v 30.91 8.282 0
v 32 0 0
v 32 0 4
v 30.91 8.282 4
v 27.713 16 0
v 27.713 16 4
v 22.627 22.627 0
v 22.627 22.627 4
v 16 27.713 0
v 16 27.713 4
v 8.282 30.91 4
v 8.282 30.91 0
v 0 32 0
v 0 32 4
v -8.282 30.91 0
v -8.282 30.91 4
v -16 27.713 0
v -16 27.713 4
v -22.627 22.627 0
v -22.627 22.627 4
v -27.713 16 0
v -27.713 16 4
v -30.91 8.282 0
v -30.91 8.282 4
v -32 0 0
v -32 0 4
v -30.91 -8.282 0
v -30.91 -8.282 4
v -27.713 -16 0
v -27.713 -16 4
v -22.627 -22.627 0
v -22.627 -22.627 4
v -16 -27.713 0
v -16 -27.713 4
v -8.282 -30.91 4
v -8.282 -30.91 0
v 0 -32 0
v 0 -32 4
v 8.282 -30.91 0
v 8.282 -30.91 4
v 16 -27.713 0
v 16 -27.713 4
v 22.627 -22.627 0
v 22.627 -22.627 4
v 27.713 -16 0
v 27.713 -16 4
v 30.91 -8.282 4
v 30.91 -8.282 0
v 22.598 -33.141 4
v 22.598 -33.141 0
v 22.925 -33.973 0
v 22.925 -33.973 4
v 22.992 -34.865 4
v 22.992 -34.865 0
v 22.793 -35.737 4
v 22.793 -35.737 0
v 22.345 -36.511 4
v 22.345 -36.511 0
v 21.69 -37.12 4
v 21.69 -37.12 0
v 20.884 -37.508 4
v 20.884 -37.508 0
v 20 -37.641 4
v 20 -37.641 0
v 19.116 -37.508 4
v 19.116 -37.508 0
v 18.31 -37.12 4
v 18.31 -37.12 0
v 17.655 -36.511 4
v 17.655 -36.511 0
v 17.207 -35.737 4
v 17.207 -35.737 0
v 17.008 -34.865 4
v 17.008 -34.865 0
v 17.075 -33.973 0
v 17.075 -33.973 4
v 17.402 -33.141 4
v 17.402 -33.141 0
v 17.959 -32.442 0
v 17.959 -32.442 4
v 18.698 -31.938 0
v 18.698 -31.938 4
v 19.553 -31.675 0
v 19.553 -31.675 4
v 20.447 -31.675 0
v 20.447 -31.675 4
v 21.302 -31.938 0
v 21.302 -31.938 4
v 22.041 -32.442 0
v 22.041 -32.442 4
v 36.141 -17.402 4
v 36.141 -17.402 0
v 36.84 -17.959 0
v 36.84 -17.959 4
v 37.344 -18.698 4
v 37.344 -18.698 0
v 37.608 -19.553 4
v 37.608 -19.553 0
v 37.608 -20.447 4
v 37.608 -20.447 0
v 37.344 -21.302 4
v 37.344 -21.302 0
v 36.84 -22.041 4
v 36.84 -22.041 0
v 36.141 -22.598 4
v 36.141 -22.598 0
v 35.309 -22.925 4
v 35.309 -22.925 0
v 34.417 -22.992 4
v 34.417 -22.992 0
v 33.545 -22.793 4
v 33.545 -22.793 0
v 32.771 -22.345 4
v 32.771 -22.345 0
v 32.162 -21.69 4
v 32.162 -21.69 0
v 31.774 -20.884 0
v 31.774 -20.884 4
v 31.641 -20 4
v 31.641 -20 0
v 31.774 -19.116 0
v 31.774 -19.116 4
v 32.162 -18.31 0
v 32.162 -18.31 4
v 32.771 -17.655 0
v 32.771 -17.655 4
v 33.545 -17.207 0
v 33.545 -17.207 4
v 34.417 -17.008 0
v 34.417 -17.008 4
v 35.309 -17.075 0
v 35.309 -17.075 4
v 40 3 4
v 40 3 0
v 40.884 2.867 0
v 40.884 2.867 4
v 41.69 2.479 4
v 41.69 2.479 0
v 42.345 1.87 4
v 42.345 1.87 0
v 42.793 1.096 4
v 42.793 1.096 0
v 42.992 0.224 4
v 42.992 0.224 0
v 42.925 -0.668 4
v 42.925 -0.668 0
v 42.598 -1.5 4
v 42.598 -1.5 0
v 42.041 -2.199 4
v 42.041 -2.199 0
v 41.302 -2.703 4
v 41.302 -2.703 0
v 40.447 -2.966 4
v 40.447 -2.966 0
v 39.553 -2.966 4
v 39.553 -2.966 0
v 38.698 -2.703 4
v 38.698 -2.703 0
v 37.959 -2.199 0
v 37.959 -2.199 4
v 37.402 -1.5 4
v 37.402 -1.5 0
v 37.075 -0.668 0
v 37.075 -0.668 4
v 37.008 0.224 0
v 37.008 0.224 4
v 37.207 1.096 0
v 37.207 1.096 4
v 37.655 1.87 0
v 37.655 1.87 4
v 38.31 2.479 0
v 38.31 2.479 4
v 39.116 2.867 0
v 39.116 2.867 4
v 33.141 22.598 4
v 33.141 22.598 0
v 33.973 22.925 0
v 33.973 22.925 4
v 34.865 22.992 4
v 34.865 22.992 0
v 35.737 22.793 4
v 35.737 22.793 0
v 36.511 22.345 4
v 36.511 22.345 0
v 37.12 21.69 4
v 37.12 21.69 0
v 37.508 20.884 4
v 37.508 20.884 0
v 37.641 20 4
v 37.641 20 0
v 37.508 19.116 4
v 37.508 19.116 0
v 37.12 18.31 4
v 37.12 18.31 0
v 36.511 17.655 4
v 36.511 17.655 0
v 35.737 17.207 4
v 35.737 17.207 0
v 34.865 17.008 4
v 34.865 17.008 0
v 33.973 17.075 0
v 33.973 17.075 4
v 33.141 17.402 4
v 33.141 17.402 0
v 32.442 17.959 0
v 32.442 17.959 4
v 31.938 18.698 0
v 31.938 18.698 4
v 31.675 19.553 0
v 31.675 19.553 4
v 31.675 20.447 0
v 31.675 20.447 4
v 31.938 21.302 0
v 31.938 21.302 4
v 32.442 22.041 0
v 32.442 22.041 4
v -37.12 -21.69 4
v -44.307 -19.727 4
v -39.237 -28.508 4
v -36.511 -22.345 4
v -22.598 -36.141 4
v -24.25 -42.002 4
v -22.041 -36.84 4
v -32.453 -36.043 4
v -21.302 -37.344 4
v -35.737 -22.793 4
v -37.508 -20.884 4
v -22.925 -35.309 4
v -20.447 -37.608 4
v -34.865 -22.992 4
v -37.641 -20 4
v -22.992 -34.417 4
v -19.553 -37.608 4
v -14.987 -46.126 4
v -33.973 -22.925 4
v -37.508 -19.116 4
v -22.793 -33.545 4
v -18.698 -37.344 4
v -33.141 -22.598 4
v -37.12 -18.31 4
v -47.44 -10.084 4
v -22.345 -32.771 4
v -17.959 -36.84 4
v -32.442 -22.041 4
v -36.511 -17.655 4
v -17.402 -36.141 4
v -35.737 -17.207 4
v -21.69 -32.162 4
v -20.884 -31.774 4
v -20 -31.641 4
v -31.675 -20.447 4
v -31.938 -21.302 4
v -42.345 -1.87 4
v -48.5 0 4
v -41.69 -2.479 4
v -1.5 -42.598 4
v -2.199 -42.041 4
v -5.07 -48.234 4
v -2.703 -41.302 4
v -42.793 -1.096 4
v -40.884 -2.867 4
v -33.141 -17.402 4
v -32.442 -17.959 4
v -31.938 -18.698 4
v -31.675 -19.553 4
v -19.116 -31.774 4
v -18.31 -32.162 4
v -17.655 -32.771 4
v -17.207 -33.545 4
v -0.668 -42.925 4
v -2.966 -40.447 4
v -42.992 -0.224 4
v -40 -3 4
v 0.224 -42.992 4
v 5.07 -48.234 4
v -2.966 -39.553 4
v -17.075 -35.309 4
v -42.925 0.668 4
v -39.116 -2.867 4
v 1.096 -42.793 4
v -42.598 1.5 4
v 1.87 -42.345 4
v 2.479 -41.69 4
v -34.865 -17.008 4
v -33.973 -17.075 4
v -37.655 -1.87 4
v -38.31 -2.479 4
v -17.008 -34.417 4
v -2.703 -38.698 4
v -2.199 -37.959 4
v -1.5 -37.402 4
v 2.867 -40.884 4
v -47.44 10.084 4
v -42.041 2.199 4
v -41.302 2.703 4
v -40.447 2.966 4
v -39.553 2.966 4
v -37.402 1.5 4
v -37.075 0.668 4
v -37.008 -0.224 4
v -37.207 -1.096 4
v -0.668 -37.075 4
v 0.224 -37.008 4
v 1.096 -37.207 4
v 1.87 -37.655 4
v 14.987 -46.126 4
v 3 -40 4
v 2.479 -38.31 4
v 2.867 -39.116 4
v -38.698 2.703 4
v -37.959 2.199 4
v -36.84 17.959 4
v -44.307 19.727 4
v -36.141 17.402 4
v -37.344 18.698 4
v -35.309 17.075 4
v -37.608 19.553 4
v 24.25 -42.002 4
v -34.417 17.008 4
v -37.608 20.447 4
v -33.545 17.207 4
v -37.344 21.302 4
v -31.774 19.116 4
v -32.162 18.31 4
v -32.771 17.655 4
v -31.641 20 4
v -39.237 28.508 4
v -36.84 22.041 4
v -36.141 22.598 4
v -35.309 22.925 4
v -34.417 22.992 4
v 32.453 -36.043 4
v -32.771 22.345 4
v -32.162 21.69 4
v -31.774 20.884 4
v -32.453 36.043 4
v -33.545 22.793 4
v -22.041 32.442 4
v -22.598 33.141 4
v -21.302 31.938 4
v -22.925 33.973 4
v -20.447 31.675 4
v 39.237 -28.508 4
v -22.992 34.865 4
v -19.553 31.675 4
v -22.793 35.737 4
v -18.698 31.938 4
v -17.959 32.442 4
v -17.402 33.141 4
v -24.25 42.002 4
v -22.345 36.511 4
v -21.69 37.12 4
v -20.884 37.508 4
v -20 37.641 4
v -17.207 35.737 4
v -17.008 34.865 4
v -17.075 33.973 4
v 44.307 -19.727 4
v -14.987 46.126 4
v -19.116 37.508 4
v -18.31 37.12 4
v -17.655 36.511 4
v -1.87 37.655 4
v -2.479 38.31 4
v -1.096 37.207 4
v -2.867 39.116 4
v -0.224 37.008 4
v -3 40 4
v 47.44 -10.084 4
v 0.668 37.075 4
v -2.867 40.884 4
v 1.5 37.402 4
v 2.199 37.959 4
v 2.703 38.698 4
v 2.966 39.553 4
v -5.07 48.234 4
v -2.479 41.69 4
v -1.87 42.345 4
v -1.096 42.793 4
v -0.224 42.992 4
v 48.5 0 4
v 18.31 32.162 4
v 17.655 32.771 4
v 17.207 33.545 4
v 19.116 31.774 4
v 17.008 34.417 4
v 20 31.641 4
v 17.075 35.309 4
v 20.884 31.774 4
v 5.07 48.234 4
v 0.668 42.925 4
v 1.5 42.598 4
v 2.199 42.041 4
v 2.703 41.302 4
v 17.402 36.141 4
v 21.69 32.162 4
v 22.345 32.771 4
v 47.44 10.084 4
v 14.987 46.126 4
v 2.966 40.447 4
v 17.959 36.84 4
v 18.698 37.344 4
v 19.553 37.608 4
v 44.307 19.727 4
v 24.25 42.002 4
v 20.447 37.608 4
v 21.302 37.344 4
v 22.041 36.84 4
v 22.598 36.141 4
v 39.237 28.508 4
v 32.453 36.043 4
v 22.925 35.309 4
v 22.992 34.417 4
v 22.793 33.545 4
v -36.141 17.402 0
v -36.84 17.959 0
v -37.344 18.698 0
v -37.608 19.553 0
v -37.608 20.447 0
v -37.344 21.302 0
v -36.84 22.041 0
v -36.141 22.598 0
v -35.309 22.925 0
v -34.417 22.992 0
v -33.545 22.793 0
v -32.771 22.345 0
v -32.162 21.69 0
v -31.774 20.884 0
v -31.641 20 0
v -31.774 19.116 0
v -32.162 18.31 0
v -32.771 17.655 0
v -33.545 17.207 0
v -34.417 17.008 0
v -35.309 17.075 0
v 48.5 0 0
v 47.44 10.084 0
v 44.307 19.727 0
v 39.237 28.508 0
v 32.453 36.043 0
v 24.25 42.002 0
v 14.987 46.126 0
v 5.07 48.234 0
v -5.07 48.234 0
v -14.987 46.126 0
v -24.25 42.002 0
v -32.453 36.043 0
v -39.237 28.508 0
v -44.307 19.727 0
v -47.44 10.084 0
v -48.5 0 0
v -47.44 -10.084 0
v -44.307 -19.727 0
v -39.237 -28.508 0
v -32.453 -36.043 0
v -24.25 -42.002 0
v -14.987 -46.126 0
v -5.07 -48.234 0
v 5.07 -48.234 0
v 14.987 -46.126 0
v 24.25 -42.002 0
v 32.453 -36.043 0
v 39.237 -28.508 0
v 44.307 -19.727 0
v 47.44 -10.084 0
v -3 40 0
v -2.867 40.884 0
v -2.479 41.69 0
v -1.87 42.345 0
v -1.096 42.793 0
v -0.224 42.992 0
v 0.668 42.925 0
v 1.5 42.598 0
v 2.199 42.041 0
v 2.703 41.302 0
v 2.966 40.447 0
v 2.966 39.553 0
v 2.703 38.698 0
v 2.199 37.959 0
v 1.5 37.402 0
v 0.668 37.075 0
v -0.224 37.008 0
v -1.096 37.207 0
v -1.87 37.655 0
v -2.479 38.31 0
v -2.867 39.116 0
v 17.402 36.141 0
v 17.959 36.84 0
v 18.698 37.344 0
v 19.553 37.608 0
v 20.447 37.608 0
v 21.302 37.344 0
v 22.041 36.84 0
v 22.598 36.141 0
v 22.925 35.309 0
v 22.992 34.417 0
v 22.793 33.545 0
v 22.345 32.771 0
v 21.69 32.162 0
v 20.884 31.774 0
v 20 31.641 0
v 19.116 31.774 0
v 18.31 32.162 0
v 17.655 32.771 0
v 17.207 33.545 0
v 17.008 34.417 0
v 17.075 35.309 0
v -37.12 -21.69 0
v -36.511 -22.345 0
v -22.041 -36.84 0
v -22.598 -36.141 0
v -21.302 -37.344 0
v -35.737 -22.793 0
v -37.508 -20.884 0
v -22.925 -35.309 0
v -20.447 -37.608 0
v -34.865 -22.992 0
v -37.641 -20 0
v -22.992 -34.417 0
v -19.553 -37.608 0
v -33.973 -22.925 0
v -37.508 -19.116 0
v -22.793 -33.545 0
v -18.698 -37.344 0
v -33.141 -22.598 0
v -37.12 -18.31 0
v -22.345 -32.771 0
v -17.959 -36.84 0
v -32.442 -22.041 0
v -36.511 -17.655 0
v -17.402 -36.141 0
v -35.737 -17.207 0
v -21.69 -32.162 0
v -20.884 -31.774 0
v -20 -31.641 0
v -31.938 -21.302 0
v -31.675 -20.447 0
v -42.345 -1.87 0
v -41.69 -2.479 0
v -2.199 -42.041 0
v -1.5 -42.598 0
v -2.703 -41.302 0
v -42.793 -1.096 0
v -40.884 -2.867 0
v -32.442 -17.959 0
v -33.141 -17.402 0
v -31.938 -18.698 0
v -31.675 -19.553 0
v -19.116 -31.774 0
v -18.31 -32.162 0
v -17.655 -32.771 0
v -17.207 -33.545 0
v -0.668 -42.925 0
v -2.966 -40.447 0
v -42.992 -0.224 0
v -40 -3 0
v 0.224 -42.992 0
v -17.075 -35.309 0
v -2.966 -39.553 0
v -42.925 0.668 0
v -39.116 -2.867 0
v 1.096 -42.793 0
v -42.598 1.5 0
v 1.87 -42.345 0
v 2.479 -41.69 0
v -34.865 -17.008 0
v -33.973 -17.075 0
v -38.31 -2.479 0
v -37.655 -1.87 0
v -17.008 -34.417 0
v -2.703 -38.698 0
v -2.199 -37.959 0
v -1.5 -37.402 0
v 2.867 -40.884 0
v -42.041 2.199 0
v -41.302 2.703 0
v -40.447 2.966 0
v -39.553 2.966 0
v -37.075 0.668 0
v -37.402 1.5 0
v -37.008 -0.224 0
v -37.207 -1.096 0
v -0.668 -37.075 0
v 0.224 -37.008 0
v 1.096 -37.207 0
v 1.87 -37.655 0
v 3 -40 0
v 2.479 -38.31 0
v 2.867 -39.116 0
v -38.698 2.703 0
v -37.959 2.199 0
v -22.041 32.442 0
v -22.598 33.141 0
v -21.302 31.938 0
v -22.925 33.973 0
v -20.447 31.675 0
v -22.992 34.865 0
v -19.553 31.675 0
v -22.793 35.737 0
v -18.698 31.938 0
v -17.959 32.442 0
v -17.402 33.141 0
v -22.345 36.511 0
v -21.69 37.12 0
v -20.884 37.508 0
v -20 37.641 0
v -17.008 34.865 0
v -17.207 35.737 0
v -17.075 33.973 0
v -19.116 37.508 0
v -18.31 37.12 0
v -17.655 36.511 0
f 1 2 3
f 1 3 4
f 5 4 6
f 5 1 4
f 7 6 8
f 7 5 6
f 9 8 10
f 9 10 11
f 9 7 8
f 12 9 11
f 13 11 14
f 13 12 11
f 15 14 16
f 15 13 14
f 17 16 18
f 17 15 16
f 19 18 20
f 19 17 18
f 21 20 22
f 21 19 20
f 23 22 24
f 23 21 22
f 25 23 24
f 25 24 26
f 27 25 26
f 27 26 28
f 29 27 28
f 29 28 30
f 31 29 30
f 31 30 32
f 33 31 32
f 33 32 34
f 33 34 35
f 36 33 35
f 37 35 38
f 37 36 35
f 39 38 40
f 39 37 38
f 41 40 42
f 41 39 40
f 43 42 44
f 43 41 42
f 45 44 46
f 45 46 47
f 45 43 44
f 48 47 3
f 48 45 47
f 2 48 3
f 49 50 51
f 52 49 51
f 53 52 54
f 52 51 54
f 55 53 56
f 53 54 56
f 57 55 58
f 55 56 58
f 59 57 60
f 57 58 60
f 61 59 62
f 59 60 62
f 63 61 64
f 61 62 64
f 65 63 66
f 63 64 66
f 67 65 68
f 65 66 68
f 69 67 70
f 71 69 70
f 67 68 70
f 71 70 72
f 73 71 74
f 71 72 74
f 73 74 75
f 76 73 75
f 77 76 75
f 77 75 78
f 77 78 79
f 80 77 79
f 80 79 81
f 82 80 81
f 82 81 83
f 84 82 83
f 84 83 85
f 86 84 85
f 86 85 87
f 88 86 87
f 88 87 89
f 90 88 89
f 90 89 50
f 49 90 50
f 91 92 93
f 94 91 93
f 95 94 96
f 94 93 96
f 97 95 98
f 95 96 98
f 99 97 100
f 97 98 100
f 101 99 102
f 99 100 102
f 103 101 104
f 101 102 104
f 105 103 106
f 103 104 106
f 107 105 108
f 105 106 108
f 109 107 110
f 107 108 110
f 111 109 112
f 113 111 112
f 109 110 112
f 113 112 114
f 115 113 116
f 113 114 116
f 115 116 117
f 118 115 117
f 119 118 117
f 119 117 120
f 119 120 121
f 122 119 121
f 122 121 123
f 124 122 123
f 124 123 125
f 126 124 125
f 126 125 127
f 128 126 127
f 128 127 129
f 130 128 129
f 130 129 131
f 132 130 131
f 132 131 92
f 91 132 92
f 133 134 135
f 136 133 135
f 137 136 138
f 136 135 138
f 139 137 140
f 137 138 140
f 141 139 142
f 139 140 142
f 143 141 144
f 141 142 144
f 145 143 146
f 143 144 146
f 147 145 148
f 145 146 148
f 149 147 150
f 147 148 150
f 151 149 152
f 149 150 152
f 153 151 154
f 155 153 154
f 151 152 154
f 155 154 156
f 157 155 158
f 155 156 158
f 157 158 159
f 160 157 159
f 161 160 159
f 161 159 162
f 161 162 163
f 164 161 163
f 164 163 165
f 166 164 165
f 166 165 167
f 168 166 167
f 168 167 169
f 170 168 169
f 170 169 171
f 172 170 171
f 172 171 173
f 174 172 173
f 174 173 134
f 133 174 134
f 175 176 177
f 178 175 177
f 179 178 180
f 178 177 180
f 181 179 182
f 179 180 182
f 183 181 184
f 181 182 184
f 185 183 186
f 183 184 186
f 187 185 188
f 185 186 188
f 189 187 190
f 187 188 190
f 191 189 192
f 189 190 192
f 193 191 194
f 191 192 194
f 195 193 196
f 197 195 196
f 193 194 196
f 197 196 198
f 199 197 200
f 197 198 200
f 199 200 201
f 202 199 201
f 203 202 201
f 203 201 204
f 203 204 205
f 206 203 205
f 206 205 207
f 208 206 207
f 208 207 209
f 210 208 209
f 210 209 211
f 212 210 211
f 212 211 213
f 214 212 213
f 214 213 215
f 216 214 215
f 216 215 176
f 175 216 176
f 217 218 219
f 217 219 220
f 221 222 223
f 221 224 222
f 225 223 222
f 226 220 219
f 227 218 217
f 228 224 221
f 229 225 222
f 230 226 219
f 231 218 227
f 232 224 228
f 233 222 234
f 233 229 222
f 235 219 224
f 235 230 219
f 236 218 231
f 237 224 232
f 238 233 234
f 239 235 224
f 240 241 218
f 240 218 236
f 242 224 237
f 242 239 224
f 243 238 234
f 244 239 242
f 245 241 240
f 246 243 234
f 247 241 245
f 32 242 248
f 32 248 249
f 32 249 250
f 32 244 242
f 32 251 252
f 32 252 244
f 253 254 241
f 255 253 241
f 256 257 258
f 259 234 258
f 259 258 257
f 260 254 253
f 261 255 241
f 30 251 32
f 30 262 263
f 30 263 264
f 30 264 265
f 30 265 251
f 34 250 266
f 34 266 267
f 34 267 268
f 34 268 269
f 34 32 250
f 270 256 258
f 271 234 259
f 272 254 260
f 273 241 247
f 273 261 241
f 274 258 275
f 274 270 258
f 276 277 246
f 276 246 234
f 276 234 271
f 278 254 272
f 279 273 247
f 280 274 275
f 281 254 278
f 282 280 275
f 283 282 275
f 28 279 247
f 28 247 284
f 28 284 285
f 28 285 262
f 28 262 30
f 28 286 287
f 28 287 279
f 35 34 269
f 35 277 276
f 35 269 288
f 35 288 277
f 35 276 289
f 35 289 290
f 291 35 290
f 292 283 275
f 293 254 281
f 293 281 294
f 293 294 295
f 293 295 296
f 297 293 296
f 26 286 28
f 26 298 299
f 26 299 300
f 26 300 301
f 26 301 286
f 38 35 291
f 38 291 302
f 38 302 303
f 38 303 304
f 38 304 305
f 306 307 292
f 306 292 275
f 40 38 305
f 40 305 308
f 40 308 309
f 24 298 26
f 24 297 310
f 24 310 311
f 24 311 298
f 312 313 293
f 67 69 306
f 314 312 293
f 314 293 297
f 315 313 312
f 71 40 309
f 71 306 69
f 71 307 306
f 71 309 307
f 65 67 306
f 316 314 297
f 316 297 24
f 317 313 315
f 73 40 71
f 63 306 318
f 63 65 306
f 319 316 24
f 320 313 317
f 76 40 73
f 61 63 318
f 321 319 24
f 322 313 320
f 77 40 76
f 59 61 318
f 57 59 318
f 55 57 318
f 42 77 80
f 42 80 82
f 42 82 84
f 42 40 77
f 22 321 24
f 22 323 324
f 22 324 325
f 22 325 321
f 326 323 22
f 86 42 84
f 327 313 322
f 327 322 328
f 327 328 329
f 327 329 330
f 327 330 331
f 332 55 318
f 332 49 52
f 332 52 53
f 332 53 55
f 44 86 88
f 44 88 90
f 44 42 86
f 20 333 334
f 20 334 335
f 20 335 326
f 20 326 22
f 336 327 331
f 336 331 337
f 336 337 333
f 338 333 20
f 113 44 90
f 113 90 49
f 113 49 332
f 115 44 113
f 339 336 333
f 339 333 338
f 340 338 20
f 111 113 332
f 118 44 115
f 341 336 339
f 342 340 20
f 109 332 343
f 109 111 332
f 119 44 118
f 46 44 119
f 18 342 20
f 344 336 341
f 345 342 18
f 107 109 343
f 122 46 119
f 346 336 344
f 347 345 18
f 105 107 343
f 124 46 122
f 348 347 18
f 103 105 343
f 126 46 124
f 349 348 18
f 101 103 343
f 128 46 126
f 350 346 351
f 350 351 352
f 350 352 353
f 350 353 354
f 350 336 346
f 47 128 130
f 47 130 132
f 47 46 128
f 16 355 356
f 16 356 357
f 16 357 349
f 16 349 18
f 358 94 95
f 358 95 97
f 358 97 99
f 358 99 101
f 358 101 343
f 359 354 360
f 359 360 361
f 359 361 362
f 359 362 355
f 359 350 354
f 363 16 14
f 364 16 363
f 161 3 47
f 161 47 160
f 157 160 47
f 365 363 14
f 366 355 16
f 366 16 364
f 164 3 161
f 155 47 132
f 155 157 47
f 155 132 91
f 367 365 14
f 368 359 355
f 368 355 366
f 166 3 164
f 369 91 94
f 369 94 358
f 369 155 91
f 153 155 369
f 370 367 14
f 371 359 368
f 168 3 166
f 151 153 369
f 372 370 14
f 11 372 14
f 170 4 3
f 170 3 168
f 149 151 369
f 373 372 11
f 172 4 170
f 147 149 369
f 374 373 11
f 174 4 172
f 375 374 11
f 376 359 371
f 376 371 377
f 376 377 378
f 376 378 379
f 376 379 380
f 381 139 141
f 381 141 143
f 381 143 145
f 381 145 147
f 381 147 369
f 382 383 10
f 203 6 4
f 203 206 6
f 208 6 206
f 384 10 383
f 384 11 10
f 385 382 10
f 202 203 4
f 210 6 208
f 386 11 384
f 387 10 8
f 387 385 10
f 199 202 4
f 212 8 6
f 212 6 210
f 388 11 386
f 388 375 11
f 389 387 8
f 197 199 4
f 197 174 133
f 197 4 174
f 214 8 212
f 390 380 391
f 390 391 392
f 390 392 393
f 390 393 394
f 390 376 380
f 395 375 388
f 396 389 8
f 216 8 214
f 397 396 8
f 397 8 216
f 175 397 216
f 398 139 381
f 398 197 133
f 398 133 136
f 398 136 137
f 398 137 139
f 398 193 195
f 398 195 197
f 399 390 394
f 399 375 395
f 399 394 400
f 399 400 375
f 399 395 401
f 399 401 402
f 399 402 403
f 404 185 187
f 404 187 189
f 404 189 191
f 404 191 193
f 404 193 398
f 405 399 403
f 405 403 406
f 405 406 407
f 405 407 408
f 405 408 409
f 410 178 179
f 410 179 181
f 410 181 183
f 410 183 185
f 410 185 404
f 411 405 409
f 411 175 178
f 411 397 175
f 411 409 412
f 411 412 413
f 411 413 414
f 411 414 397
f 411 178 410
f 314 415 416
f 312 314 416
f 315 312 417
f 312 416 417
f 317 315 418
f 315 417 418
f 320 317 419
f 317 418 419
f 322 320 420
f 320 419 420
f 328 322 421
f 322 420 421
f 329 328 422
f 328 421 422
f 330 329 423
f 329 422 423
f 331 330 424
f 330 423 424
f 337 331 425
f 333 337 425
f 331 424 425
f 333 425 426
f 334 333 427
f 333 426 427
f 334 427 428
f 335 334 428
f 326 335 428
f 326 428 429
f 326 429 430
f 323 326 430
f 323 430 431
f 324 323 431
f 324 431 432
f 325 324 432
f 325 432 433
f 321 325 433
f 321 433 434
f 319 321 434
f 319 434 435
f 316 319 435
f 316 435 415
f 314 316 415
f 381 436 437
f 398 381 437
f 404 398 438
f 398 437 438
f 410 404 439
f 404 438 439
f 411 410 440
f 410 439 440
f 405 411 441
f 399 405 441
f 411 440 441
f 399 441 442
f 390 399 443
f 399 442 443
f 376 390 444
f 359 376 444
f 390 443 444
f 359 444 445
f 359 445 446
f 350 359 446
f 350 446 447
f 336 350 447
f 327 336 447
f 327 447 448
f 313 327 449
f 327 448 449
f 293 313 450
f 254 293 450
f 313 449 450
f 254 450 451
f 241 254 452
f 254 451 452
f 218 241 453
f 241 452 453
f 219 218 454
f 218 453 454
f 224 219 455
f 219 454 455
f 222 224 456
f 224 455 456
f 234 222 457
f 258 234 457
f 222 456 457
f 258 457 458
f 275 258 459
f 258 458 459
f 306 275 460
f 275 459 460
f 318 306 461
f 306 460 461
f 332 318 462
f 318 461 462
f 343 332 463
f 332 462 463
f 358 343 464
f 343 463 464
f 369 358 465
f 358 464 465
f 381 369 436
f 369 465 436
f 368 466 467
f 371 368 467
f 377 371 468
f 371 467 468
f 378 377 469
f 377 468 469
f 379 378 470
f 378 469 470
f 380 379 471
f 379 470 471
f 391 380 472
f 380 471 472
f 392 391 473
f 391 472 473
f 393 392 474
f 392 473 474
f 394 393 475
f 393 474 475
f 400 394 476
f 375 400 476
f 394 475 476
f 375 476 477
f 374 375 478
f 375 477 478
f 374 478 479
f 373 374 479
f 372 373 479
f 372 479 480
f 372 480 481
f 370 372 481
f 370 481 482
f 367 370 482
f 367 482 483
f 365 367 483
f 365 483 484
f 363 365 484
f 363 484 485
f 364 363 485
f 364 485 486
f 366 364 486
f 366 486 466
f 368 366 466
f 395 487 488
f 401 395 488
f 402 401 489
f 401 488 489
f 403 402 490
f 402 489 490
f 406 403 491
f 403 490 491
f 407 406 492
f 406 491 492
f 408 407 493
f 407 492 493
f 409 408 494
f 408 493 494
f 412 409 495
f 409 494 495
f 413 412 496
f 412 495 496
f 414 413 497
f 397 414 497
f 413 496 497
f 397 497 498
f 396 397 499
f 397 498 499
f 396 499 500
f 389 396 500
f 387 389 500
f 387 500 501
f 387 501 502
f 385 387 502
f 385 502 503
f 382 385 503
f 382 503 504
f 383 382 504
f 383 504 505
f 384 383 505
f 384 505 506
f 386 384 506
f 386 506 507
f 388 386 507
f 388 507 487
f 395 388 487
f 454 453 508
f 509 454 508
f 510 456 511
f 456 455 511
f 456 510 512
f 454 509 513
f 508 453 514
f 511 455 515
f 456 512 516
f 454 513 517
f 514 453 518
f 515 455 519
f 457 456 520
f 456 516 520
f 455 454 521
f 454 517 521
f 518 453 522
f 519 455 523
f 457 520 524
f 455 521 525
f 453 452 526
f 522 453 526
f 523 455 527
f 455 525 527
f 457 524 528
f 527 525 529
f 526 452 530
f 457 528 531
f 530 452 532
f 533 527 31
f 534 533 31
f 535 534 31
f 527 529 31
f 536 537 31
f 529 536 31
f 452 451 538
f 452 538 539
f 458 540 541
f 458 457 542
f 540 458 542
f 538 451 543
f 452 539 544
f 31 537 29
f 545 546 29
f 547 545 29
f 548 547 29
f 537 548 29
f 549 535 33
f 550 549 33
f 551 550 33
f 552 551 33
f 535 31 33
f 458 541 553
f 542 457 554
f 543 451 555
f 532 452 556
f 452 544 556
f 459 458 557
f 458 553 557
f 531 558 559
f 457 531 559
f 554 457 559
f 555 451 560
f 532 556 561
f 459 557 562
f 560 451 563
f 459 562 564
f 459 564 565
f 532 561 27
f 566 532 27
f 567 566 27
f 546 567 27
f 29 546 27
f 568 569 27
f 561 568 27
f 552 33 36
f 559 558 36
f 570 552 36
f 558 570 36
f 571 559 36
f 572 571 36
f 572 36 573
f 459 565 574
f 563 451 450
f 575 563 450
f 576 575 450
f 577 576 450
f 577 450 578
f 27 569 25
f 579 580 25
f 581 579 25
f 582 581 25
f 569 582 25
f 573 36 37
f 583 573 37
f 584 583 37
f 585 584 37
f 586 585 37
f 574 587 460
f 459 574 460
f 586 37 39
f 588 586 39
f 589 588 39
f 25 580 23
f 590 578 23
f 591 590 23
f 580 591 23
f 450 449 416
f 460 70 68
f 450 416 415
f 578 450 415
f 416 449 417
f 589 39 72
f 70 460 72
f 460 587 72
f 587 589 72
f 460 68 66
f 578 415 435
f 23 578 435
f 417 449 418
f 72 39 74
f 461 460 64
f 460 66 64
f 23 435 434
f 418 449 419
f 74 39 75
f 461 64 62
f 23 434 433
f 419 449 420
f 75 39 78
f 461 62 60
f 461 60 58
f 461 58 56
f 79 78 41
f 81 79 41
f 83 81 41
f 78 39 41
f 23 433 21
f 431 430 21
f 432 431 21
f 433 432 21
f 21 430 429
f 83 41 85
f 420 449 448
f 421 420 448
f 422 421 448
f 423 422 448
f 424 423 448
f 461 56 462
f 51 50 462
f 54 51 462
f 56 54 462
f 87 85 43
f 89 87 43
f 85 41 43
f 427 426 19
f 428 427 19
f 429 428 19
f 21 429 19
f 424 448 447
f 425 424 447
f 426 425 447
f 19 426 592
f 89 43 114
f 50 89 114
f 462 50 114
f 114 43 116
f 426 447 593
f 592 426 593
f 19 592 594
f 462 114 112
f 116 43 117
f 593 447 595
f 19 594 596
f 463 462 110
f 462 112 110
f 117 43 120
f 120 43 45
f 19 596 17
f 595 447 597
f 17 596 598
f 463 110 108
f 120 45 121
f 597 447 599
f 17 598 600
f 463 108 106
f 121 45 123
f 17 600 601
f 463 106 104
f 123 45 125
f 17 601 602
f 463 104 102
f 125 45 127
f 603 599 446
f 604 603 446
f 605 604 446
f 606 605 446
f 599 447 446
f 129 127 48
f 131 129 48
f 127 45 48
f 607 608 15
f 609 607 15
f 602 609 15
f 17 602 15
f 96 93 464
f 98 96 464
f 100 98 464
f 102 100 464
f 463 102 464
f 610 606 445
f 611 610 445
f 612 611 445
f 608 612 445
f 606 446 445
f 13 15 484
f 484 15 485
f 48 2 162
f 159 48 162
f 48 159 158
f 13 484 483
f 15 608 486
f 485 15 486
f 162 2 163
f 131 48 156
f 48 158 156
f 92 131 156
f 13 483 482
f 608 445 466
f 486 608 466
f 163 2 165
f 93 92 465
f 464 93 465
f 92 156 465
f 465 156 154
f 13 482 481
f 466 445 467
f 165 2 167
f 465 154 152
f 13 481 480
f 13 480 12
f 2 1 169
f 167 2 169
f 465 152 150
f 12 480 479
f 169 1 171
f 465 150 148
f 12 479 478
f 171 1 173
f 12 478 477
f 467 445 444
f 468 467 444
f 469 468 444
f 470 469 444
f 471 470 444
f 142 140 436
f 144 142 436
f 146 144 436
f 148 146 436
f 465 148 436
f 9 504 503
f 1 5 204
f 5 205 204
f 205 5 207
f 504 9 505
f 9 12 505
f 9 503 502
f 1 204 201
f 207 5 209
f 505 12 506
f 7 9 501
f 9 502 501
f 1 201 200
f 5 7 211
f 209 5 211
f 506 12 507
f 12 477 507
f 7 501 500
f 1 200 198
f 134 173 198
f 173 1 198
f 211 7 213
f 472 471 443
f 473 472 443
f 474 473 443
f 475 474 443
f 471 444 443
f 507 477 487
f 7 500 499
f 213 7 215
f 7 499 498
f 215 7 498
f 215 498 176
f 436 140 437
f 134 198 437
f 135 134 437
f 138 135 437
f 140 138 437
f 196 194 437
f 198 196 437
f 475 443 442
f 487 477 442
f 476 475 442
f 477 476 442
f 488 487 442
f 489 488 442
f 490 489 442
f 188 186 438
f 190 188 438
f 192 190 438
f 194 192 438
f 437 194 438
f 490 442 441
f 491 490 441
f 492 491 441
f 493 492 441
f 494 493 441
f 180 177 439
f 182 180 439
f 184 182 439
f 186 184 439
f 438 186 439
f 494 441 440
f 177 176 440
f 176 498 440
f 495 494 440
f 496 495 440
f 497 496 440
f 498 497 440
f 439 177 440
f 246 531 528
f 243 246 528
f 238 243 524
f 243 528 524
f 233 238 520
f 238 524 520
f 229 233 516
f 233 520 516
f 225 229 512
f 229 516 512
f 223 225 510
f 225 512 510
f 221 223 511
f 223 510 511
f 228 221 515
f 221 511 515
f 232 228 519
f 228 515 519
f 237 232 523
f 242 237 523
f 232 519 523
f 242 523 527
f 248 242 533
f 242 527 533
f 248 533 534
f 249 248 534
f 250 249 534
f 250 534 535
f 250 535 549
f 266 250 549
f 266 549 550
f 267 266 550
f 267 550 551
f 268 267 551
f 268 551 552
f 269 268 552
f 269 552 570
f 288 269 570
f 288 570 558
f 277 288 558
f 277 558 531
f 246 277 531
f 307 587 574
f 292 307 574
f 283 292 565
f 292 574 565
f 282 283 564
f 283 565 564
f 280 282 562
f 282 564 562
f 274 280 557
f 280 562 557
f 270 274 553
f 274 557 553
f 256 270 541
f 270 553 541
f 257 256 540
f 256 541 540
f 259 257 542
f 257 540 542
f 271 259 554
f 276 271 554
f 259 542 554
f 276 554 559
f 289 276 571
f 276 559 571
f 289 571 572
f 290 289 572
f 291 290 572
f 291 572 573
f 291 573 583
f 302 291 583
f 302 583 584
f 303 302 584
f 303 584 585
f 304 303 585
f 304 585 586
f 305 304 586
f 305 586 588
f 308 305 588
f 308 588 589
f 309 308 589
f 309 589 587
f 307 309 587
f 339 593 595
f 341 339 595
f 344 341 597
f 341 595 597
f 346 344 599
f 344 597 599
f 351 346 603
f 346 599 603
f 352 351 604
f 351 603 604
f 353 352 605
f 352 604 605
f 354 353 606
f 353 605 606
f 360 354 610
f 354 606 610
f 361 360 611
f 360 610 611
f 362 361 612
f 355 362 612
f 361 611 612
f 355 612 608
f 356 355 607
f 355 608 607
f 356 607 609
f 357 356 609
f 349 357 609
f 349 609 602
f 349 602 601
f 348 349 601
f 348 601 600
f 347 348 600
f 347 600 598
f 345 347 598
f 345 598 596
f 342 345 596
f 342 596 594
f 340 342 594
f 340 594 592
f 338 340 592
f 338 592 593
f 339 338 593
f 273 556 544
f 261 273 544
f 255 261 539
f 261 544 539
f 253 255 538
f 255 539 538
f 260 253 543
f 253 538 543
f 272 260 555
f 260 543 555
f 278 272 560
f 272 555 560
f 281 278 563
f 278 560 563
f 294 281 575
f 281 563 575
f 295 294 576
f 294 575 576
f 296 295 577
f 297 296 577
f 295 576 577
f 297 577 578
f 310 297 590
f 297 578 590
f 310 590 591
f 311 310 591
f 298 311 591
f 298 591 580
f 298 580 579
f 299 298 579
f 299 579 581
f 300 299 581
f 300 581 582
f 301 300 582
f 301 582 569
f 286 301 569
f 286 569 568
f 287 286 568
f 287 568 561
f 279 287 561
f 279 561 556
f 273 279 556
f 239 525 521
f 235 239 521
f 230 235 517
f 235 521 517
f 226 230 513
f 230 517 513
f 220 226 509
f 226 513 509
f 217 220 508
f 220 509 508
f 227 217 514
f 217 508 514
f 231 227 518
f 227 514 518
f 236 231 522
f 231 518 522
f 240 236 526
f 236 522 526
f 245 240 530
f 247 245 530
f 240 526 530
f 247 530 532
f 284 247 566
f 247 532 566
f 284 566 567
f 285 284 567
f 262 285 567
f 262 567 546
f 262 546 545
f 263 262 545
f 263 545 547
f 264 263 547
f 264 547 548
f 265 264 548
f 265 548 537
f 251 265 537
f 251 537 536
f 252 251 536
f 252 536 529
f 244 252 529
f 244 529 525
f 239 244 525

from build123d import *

# Parameters (mm, degrees)
SKETCH_1_R               = 48.5
SKETCH_1_R_2             = 32
EXTRUDE_1_DEPTH          = 4
SKETCH_2_R               = 3
CUT_EXTRUDE_1_DEPTH      = 18.6
PATTERN_CIRCULAR_1_COUNT = 12


with BuildPart() as part:
    # Эскиз1 → Бобышка-Вытянуть1 (new body)
    with BuildSketch(Plane.XY):
        Circle(SKETCH_1_R)
        Circle(SKETCH_1_R_2, mode=Mode.SUBTRACT)
    extrude(amount=EXTRUDE_1_DEPTH)

    # Эскиз2 → Вырез-Вытянуть1 (cut)
    with BuildSketch(Plane(origin=(0, 0, 0), x_dir=(-1, 0, 0), z_dir=(0, 0, -1))):
        with Locations((0, 40)):
            Circle(SKETCH_2_R)
    cut_extrude_1 = extrude(amount=-CUT_EXTRUDE_1_DEPTH, mode=Mode.SUBTRACT)

    # Круговой массив1: Вырез-Вытянуть1 ×12 about axis
    pattern_circular_1_axis = Axis((0, 0, 0), (0, 0, 1))
    for i in range(1, PATTERN_CIRCULAR_1_COUNT):
        add(cut_extrude_1.rotate(pattern_circular_1_axis, i * 360 / PATTERN_CIRCULAR_1_COUNT), mode=Mode.SUBTRACT)


solid = part.part
